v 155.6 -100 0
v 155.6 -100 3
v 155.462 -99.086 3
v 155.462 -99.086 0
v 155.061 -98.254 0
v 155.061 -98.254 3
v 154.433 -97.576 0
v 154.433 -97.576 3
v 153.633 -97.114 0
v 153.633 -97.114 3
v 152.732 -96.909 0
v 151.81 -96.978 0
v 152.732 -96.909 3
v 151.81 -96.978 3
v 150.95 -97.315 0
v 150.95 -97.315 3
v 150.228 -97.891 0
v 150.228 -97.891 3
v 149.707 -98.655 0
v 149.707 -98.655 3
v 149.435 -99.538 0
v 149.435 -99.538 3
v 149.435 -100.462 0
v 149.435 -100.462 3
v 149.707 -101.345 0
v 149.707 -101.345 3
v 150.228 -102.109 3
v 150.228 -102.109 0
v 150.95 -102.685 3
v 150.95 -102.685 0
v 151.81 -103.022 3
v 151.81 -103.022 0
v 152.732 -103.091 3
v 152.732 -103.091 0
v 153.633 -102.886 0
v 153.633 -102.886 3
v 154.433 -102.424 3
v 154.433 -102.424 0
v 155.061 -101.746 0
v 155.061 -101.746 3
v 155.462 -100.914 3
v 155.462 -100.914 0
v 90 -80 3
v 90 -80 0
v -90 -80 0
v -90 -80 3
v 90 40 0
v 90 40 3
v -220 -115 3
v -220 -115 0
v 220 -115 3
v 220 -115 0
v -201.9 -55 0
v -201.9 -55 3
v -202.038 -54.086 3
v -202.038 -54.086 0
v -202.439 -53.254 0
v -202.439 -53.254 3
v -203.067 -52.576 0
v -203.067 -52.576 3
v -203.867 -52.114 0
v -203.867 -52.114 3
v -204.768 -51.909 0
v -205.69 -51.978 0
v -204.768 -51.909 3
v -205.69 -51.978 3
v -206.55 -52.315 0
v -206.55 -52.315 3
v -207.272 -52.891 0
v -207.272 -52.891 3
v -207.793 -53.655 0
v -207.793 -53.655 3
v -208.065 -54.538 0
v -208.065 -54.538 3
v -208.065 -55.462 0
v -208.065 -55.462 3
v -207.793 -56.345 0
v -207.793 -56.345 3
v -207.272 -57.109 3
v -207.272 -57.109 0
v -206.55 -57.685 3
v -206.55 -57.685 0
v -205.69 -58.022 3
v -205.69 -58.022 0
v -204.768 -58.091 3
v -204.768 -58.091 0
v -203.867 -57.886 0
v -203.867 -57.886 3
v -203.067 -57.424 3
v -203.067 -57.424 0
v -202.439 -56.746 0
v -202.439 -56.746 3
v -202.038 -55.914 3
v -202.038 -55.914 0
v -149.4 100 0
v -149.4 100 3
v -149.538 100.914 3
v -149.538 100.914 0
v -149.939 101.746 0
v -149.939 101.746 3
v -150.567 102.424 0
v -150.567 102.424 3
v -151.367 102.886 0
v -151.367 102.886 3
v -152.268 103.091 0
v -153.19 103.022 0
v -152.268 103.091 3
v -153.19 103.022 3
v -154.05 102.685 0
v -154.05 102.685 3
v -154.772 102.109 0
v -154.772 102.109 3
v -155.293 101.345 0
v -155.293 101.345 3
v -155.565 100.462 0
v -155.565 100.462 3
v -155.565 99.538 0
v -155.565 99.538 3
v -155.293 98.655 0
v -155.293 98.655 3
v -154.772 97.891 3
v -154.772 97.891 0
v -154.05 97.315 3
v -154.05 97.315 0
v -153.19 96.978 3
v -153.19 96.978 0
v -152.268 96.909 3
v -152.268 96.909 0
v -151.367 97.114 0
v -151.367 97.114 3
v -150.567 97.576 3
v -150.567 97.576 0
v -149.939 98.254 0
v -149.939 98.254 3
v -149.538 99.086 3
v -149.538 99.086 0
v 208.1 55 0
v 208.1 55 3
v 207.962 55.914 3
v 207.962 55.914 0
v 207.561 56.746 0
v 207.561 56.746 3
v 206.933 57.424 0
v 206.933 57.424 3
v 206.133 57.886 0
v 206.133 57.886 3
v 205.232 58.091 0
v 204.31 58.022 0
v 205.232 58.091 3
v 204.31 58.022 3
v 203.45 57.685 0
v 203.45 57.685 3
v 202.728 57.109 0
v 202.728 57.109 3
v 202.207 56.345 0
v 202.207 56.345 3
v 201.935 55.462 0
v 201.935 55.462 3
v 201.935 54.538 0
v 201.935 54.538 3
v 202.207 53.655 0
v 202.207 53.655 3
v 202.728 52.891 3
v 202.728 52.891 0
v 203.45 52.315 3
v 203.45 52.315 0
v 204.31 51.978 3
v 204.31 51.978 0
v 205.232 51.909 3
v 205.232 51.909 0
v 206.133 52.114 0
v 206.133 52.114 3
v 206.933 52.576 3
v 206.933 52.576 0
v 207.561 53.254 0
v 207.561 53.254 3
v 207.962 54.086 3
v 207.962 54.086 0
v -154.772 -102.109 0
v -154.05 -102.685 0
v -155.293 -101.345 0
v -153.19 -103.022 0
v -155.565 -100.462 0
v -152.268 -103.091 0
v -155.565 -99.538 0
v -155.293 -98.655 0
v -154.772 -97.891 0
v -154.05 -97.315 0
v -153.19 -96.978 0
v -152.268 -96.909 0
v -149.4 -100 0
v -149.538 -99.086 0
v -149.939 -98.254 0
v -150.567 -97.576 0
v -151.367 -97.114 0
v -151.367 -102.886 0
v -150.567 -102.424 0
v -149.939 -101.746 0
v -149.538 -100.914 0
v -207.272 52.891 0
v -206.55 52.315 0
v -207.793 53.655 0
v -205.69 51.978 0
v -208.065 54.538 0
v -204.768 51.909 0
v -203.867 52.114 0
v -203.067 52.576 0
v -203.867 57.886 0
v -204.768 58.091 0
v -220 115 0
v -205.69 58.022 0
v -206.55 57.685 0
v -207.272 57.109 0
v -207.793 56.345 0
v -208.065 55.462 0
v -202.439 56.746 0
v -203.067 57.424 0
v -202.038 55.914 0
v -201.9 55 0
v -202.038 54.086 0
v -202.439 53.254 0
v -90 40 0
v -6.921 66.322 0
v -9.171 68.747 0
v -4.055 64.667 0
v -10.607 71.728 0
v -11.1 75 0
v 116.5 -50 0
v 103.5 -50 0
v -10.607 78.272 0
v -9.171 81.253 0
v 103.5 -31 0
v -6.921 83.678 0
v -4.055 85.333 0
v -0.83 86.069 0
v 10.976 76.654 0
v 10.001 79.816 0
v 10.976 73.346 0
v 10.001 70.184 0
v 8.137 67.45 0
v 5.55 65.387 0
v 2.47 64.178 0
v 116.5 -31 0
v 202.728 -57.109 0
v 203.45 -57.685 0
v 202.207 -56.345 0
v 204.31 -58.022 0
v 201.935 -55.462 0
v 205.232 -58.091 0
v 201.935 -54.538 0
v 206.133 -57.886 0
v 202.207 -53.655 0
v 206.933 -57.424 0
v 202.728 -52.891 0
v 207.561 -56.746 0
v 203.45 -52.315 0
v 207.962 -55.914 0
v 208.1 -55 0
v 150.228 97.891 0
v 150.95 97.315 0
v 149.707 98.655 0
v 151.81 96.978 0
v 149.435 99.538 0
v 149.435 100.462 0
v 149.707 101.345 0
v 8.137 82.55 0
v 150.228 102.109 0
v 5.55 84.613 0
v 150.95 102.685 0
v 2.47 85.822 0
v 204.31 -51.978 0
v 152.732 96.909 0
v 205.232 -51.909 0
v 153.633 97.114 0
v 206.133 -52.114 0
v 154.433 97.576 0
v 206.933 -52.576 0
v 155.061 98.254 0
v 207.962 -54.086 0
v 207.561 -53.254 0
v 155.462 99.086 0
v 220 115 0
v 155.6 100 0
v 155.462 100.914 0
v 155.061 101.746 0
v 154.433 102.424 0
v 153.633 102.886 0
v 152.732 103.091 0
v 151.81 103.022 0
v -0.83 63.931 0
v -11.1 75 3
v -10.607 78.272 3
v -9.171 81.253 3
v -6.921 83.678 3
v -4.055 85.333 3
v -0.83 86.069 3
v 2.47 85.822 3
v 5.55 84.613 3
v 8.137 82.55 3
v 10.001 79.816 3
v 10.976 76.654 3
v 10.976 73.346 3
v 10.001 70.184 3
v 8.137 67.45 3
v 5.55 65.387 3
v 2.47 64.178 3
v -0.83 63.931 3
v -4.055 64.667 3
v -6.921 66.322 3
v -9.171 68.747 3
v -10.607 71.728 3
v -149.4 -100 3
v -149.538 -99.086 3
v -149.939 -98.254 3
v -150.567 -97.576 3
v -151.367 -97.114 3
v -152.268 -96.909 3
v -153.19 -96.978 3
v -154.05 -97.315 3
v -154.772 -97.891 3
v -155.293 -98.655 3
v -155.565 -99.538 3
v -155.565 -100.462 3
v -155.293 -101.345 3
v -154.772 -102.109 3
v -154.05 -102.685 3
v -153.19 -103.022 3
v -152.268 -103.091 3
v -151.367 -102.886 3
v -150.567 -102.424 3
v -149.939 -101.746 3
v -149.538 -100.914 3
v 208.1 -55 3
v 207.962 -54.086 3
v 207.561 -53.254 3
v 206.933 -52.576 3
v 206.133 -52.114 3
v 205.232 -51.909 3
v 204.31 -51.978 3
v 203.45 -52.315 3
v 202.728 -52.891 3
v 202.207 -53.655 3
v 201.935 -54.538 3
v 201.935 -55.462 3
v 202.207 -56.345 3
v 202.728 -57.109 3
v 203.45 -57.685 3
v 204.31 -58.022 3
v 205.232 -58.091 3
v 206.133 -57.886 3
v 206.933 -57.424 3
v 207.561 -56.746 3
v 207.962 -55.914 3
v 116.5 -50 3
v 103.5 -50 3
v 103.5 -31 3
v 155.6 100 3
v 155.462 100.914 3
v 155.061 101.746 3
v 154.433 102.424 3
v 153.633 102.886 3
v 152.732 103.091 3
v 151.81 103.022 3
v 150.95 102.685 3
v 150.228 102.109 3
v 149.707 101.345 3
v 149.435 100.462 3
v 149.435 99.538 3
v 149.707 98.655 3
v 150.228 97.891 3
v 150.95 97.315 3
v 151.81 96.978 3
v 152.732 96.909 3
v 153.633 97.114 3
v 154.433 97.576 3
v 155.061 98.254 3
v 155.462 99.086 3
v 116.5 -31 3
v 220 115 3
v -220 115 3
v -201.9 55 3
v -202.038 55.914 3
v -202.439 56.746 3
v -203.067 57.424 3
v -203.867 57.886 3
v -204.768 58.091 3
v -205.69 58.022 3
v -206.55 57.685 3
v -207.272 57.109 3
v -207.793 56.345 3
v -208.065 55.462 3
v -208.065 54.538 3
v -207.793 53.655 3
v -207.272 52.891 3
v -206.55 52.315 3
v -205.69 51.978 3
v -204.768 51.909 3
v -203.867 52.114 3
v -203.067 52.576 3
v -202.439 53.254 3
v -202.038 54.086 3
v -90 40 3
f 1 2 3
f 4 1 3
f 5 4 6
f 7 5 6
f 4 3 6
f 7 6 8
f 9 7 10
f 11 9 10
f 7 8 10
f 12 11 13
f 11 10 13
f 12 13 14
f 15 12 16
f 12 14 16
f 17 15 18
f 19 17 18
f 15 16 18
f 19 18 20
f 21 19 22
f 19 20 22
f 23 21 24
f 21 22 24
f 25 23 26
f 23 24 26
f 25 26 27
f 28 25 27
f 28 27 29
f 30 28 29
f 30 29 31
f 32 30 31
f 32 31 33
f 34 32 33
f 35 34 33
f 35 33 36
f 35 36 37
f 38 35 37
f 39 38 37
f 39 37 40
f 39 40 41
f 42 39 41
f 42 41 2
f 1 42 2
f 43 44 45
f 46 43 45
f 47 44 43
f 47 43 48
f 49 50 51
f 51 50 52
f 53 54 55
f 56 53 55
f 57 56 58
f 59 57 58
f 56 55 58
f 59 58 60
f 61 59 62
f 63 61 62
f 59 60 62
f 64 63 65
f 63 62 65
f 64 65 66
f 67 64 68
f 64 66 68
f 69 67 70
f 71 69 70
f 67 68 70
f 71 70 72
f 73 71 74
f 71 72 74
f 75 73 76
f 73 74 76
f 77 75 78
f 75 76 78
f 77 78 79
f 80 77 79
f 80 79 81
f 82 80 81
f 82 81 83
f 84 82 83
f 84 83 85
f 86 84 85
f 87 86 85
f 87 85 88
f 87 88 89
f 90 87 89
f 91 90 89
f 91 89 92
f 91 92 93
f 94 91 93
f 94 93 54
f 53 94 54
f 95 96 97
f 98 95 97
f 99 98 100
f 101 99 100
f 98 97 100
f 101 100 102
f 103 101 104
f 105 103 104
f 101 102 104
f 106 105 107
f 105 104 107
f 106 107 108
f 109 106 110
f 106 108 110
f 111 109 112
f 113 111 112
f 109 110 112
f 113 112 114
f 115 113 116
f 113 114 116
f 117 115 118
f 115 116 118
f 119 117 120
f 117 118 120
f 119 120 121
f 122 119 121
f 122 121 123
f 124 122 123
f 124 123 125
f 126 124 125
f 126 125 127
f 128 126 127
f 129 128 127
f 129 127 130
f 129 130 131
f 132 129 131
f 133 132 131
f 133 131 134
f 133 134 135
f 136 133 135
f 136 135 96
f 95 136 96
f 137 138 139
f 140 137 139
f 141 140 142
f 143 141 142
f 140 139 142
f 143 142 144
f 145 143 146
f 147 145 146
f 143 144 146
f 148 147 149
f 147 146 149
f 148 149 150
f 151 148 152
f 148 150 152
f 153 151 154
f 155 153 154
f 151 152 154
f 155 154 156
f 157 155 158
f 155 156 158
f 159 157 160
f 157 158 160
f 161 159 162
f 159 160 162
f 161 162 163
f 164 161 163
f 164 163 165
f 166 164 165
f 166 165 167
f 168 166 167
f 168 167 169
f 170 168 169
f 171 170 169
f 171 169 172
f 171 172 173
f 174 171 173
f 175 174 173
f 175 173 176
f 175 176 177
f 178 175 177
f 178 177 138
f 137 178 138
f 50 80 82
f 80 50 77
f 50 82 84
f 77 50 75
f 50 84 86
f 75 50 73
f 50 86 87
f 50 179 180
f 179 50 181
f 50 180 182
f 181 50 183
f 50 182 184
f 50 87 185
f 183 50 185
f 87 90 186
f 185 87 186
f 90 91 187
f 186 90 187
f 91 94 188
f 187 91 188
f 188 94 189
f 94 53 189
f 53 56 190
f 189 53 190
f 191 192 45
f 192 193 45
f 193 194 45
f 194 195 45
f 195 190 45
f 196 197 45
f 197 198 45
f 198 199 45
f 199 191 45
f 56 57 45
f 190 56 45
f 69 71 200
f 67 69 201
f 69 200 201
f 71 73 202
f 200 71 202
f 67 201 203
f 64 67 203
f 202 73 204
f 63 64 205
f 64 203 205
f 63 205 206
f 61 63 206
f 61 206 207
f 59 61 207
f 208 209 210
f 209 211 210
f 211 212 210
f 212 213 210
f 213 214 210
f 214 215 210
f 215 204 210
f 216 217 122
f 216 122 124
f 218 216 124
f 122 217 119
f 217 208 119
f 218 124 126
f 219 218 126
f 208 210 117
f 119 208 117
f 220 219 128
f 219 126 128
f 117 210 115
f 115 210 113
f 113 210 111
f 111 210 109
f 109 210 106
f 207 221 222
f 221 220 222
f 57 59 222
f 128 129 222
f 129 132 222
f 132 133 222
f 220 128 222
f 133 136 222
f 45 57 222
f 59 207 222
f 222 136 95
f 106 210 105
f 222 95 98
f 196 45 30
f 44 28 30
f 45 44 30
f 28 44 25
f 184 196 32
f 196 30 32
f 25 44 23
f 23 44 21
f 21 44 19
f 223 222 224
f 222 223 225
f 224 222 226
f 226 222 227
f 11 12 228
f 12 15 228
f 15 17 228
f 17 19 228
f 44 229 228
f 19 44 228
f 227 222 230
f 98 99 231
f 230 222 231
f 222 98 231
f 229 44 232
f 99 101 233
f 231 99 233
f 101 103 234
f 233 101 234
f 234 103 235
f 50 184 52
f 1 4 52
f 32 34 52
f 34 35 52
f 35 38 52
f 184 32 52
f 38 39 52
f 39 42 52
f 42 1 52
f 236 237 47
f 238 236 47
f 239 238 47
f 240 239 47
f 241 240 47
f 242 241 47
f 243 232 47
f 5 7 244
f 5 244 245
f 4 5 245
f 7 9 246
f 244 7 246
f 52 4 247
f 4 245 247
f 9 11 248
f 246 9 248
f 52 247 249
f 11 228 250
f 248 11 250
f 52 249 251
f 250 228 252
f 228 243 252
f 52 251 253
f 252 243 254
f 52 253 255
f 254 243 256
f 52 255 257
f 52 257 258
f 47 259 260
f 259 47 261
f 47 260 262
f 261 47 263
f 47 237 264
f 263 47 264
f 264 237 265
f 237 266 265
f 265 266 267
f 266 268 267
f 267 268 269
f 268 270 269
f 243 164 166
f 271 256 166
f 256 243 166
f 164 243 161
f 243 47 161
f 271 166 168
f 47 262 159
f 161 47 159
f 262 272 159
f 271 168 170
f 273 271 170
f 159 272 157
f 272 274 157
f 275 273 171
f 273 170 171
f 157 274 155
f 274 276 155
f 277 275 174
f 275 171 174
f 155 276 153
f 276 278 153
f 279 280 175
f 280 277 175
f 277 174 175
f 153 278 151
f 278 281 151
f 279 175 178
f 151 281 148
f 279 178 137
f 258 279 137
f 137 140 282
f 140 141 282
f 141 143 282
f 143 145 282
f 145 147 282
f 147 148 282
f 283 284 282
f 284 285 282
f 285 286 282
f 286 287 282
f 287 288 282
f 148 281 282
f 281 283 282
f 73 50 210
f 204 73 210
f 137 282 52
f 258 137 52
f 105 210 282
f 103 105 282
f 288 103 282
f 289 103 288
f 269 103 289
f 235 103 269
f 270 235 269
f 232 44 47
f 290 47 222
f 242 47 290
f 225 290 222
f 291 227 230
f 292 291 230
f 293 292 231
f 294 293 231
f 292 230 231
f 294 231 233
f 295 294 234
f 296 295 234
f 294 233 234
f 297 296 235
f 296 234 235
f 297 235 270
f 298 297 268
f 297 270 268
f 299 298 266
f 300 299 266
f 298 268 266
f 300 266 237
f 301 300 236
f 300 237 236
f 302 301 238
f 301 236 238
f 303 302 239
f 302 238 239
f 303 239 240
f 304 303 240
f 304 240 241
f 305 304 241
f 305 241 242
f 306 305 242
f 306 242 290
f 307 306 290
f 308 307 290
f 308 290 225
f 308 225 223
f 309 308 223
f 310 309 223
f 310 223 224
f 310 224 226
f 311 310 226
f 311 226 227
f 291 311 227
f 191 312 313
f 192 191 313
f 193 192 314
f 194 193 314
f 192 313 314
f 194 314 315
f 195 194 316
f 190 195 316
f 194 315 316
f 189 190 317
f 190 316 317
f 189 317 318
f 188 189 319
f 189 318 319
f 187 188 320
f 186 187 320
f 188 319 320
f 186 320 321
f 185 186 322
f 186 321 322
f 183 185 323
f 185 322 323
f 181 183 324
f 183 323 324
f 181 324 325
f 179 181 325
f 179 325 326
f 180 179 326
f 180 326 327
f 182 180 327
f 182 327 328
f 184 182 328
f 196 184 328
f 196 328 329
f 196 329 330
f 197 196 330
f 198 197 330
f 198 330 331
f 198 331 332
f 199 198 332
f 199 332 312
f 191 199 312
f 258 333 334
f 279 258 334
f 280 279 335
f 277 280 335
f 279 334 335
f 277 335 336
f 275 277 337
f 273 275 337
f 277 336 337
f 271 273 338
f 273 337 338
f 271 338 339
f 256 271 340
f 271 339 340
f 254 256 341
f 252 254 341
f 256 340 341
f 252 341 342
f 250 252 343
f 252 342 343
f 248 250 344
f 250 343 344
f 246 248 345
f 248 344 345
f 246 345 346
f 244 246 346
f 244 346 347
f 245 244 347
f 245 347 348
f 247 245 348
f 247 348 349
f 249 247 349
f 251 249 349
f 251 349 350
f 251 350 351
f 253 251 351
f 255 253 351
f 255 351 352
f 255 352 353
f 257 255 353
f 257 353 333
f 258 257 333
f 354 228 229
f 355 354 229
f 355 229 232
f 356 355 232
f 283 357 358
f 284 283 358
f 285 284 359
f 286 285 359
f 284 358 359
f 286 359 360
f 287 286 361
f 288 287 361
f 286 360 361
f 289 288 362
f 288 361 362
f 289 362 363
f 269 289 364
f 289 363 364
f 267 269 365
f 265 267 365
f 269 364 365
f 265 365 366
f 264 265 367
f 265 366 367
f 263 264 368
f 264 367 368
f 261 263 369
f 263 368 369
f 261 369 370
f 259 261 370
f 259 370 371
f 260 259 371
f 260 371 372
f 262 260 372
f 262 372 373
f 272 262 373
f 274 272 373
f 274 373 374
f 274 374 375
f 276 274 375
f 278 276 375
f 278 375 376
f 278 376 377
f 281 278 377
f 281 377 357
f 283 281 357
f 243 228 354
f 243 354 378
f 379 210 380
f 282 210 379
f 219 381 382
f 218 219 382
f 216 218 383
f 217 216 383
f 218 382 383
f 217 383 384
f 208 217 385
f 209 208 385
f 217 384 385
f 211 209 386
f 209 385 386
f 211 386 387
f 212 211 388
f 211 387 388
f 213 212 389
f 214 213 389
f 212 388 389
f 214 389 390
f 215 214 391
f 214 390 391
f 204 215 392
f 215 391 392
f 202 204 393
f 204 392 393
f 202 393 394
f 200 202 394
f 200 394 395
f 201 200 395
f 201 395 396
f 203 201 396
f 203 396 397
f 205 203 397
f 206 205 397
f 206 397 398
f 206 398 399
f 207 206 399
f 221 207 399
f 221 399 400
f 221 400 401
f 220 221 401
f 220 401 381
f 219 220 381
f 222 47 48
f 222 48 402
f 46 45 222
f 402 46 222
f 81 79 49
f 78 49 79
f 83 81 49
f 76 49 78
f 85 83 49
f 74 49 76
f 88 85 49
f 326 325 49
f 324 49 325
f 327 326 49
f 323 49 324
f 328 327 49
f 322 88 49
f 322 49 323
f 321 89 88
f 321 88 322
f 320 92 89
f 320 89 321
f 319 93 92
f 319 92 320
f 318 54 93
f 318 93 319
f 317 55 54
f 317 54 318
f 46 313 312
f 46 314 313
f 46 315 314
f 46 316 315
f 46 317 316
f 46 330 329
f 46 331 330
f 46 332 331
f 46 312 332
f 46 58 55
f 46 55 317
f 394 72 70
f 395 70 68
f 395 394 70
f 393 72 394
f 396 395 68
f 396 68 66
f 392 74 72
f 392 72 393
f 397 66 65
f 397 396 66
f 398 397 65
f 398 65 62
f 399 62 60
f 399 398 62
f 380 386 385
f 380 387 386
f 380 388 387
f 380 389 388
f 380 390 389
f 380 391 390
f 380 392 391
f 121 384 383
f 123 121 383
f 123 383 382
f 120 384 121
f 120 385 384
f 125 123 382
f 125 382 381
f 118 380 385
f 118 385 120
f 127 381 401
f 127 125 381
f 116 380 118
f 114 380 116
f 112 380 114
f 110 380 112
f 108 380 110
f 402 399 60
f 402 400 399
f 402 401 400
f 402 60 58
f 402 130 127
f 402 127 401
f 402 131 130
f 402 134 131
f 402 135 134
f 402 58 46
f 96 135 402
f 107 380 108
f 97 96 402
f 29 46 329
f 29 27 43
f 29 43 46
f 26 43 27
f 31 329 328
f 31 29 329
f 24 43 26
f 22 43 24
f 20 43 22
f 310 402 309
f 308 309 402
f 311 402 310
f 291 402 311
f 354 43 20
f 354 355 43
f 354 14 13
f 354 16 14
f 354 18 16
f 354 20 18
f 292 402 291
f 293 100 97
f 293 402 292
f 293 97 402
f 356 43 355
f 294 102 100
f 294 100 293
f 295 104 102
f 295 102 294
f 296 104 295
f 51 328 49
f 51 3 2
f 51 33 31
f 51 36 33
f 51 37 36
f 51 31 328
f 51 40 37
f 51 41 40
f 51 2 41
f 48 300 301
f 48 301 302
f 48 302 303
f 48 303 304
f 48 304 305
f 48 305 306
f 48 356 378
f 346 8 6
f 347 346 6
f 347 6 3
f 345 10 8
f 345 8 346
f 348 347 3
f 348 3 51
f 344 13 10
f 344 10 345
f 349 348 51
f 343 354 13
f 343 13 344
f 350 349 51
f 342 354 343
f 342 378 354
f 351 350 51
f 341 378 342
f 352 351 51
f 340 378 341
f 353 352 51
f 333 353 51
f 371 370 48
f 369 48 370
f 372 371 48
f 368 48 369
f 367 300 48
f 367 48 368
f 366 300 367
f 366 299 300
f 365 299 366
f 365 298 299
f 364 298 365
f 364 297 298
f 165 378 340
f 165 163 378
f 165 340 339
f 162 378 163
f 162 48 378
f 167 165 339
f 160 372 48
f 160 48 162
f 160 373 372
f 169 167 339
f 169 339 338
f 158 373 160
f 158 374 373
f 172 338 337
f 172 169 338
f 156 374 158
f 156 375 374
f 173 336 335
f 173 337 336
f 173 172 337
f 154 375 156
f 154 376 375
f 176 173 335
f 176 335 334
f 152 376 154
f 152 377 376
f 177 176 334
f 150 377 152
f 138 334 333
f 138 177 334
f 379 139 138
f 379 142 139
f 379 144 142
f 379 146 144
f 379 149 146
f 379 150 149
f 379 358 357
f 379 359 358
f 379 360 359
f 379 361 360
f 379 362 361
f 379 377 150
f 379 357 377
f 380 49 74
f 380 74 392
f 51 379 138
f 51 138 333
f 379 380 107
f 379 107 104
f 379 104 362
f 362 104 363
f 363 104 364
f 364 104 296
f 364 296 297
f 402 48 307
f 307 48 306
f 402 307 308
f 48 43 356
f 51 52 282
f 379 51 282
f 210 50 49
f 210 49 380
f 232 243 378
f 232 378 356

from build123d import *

# Parameters (mm, degrees)
CROQUIS1_W              = 440
CROQUIS1_H              = 230
SALIENTE_EXTRUIR1_DEPTH = 3
CROQUIS2_R              = 3.1
CORTAR_EXTRUIR1_DEPTH   = 4
CROQUIS3_W              = 180
CROQUIS3_H              = 120
CORTAR_EXTRUIR2_DEPTH   = 4
CROQUIS4_R              = 11.1
CORTAR_EXTRUIR3_DEPTH   = 4
CROQUIS5_W              = 13
CROQUIS5_H              = 19
CORTAR_EXTRUIR4_DEPTH   = 4


with BuildPart() as part:
    # Croquis1 → Saliente-Extruir1 (new body)
    with BuildSketch(Plane.XY):
        Rectangle(CROQUIS1_W, CROQUIS1_H)
    extrude(amount=SALIENTE_EXTRUIR1_DEPTH)

    # Croquis2 → Cortar-Extruir1 (cut, through all)
    with BuildSketch(Plane.XY.offset(3)):
        with Locations((-205, 55)):
            Circle(CROQUIS2_R)
        with Locations((-152.5, 100)):
            Circle(CROQUIS2_R)
        with Locations((152.5, 100)):
            Circle(CROQUIS2_R)
        with Locations((-205, -55)):
            Circle(CROQUIS2_R)
        with Locations((205, -55)):
            Circle(CROQUIS2_R)
        with Locations((205, 55)):
            Circle(CROQUIS2_R)
        with Locations((152.5, -100)):
            Circle(CROQUIS2_R)
        with Locations((-152.5, -100)):
            Circle(CROQUIS2_R)
    extrude(amount=-CORTAR_EXTRUIR1_DEPTH, mode=Mode.SUBTRACT)

    # Croquis3 → Cortar-Extruir2 (cut, through all)
    with BuildSketch(Plane(origin=(0, 0, 0), x_dir=(-1, 0, 0), z_dir=(0, 0, -1))):
        with Locations((0, -20)):
            Rectangle(CROQUIS3_W, CROQUIS3_H)
    extrude(amount=-CORTAR_EXTRUIR2_DEPTH, mode=Mode.SUBTRACT)

    # Croquis4 → Cortar-Extruir3 (cut, through all)
    with BuildSketch(Plane(origin=(0, 0, 0), x_dir=(-1, 0, 0), z_dir=(0, 0, -1))):
        with Locations((0, 75)):
            Circle(CROQUIS4_R)
    extrude(amount=-CORTAR_EXTRUIR3_DEPTH, mode=Mode.SUBTRACT)

    # Croquis5 → Cortar-Extruir4 (cut, through all)
    with BuildSketch(Plane(origin=(0, 0, 0), x_dir=(-1, 0, 0), z_dir=(0, 0, -1))):
        with Locations((-110, -40.5)):
            Rectangle(CROQUIS5_W, CROQUIS5_H)
    extrude(amount=-CORTAR_EXTRUIR4_DEPTH, mode=Mode.SUBTRACT)


solid = part.part
